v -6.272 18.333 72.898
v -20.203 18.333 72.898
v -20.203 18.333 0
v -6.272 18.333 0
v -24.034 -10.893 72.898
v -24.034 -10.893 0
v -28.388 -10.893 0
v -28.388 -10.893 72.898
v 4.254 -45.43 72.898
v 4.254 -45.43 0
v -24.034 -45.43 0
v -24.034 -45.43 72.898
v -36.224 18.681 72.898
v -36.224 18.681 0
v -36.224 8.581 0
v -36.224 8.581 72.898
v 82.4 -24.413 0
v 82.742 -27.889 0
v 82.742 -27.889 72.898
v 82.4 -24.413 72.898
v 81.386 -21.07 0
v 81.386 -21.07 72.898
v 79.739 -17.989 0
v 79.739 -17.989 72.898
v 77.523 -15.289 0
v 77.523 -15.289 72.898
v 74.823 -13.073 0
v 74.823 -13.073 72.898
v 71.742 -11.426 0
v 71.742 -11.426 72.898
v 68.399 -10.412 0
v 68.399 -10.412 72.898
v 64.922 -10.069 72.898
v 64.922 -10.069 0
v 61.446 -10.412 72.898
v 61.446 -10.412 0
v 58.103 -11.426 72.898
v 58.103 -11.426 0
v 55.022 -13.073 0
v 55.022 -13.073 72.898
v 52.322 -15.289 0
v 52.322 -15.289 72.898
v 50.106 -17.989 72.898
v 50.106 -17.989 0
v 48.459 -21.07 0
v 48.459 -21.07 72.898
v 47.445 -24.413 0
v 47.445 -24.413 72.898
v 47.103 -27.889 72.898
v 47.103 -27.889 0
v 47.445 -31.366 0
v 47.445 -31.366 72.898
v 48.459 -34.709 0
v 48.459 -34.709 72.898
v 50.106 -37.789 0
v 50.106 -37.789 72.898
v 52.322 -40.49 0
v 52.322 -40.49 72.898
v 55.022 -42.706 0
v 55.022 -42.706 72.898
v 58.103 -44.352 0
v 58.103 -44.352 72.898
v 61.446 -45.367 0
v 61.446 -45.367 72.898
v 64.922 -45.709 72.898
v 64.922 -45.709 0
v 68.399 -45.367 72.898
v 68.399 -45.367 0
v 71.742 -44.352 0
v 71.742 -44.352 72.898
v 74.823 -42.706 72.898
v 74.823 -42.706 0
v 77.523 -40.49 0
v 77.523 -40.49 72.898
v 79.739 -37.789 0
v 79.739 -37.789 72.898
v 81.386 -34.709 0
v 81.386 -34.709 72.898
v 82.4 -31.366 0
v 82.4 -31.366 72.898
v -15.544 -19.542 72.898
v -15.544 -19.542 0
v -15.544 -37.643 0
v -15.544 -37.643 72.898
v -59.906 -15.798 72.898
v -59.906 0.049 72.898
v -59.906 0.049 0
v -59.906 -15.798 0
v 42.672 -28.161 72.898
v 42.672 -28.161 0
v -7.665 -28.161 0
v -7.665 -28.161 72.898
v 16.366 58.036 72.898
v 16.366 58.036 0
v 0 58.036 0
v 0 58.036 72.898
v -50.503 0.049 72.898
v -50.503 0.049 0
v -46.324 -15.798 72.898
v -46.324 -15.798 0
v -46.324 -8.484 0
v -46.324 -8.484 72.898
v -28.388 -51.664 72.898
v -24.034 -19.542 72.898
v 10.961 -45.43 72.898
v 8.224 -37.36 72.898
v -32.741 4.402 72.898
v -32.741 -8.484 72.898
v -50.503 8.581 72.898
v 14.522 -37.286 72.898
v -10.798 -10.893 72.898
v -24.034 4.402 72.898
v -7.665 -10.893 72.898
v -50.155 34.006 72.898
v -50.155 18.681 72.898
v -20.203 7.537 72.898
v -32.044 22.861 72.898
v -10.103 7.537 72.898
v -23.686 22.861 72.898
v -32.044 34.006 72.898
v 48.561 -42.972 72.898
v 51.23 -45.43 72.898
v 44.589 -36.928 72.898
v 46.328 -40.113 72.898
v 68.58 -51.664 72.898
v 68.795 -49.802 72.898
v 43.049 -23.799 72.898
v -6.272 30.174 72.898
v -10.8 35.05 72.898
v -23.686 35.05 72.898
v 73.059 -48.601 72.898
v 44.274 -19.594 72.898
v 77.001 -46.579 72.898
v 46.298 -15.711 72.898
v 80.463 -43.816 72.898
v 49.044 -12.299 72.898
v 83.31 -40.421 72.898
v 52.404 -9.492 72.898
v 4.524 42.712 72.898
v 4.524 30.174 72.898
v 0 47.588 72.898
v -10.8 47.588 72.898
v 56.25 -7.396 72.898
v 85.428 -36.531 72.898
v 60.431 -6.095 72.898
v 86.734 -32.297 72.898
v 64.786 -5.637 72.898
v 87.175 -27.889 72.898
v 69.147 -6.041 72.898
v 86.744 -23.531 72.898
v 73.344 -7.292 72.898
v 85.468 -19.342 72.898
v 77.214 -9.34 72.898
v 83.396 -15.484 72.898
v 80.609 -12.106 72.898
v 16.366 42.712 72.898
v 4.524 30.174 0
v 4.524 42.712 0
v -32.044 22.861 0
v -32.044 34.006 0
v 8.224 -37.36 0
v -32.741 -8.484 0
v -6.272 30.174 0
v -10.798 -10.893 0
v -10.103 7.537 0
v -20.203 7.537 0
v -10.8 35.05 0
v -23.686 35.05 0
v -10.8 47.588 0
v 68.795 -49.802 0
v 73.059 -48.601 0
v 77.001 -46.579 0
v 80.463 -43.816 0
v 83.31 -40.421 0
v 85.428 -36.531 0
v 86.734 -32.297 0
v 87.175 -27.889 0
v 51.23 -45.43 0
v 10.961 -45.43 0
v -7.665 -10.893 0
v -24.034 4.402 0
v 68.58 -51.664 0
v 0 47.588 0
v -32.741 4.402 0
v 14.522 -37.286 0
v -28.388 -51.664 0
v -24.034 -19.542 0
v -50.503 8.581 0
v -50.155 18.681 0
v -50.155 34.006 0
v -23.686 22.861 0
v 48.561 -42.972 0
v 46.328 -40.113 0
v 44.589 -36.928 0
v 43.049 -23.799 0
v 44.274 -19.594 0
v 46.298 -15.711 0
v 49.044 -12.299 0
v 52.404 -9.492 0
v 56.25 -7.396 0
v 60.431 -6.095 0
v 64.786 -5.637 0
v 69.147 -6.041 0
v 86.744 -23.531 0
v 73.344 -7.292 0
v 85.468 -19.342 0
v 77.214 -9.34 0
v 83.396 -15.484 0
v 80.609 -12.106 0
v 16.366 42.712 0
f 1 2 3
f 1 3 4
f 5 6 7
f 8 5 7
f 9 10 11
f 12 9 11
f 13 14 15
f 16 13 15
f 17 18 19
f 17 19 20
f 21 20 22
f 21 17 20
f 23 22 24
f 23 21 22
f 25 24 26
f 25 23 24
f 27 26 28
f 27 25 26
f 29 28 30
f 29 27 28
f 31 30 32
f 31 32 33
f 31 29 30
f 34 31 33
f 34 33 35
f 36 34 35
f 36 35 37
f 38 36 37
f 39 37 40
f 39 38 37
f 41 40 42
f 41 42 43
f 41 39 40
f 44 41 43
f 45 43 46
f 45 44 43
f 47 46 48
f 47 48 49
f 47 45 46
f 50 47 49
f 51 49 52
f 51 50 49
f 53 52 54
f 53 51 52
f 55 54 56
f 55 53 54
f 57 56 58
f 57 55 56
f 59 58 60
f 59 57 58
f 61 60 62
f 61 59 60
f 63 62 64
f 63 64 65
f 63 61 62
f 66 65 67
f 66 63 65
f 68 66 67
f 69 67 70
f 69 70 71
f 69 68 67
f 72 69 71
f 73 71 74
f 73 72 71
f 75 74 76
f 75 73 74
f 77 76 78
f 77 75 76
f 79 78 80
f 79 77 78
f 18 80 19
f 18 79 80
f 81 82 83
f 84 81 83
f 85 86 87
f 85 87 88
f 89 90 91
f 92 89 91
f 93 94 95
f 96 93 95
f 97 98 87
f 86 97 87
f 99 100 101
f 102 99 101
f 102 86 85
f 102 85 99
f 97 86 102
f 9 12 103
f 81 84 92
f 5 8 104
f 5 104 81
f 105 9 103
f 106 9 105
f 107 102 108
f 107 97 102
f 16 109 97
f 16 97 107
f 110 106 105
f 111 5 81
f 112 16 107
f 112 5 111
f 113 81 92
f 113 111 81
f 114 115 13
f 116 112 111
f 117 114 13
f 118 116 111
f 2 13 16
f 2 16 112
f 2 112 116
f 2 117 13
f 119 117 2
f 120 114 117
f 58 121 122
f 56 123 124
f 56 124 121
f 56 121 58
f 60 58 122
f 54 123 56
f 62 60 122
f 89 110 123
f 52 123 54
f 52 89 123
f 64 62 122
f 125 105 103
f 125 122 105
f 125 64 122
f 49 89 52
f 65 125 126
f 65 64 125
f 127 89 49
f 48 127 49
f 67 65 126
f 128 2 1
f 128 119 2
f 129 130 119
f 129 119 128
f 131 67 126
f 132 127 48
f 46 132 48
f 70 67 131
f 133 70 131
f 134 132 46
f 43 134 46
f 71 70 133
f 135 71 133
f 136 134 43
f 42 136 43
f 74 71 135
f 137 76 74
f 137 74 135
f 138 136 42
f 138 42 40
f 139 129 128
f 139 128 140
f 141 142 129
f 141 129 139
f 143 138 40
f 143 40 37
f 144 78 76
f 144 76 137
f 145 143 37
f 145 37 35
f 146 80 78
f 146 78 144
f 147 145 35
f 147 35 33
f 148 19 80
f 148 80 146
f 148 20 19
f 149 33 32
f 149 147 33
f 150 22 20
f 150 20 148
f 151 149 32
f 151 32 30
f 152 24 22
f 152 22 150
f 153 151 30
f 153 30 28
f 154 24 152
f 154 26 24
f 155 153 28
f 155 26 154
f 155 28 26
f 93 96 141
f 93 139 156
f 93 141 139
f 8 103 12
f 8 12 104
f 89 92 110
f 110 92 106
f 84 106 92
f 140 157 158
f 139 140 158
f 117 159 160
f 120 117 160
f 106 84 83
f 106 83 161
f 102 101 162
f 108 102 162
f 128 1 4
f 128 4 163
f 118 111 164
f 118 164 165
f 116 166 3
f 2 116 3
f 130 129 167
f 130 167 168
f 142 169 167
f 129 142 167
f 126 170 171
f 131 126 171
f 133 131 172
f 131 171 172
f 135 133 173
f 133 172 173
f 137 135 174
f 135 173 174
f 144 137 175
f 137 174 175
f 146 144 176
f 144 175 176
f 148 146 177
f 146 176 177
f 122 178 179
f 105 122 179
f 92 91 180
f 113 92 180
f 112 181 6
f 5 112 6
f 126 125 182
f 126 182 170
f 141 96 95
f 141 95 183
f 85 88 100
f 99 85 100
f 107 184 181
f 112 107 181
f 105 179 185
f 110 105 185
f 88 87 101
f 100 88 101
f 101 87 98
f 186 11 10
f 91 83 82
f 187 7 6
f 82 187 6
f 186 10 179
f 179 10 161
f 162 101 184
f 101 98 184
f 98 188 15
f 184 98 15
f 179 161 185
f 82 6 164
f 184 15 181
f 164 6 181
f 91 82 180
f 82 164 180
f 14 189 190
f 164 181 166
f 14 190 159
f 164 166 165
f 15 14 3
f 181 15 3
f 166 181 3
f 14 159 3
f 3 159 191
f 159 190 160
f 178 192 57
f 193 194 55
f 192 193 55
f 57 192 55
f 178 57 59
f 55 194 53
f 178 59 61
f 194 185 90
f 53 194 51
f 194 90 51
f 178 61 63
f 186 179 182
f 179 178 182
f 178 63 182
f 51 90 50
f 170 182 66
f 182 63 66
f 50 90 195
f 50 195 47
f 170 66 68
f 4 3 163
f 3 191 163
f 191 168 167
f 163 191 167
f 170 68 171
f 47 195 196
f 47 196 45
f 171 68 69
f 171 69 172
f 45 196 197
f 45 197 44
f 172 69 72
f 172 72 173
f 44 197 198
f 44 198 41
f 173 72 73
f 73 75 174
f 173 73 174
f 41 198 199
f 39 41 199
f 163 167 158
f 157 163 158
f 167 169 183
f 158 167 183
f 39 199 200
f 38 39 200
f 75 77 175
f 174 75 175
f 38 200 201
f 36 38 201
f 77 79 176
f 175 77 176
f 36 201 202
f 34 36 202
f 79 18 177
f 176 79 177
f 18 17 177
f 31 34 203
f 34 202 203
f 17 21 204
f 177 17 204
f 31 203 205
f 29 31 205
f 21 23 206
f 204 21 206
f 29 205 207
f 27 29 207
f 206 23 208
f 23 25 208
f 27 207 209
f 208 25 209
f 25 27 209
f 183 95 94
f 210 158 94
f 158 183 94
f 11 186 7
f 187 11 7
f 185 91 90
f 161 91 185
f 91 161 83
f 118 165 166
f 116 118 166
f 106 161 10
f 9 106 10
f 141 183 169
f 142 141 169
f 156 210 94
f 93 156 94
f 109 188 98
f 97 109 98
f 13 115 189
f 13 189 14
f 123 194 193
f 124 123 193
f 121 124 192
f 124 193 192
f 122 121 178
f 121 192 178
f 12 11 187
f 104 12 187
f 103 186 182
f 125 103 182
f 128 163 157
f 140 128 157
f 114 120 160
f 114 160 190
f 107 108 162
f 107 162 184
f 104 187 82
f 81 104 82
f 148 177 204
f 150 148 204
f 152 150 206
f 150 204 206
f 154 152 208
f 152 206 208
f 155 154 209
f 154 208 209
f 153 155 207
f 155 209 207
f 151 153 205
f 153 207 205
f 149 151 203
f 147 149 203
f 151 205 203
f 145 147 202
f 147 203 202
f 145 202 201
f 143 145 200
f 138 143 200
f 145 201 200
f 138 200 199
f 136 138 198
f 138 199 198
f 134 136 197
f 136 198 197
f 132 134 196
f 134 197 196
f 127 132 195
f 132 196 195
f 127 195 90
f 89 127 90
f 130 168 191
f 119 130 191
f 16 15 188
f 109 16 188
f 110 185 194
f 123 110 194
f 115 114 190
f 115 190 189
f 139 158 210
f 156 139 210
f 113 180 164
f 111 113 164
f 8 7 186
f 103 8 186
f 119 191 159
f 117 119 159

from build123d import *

# Parameters (mm, degrees)
F0_R     = 17.819723
F1_DEPTH = 72.898


with BuildPart() as f1:
    # F0 (on Top) → F1 (new body)
    with BuildSketch(Plane.XY):
        Polygon((16.365739, 42.712353), (16.365739, 58.036424), (0, 58.036424), (0, 47.588196), (-10.799658, 47.588196), (-10.799658, 35.050321), (-23.685807, 35.050321), (-23.685807, 22.860721), (-32.044392, 22.860721), (-32.044392, 34.0055), (-50.154656, 34.0055), (-50.154656, 18.681431), (-36.223684, 18.681431), (-36.223684, 8.581474), (-50.50293, 8.581474), (-50.50293, 0.048754), (-59.906334, 0.048754), (-59.906334, -15.797727), (-46.323638, -15.797727), (-46.323638, -8.483966), (-32.740939, -8.483966), (-32.740939, 4.402183), (-24.034083, 4.402183), (-24.034083, -10.892829), (-10.797826, -10.892829), (-10.103109, 7.536652), (-20.203065, 7.536652), (-20.203065, 18.333156), (-10.103109, 18.333156), (-6.272093, 18.333156), (-6.272093, 30.174481), (4.524411, 30.174481), (4.524411, 42.712353), align=None)
        with BuildLine():
            Line((-7.66519, -10.892829), (-10.797826, -10.892829))
            Line((-10.797826, -10.892829), (-24.034083, -10.892829))
            Line((-24.034083, -10.892829), (-28.387511, -10.892829))
            Line((-28.387511, -10.892829), (-28.387511, -46.7868))
            Line((-28.387511, -46.7868), (-28.387511, -51.6636))
            Line((-28.387511, -51.6636), (68.580002, -51.6636))
            Line((68.580002, -51.6636), (68.795034, -49.802116))
            ThreePointArc((68.795034, -49.802116), (59.54773, -49.482859), (51.229698, -45.430098))
            Line((51.229698, -45.430098), (10.961137, -45.430098))
            Line((10.961137, -45.430098), (4.253947, -45.430098))
            Line((4.253947, -45.430098), (-7.66519, -45.430098))
            Line((-7.66519, -45.430098), (-24.034083, -45.430098))
            Line((-24.034083, -45.430098), (-24.034083, -19.541675))
            Line((-24.034083, -19.541675), (-15.543758, -19.541675))
            Line((-15.543758, -19.541675), (-15.543758, -32.4612))
            Line((-15.543758, -32.4612), (-15.543758, -37.642799))
            Line((-15.543758, -37.642799), (8.223667, -37.360428))
            Line((8.223667, -37.360428), (14.522387, -37.285595))
            Line((14.522387, -37.285595), (44.588531, -36.928391))
            ThreePointArc((44.588531, -36.928391), (43.183524, -32.642564), (42.671578, -28.161463))
            Line((42.671578, -28.161463), (-7.66519, -28.161463))
            Line((-7.66519, -28.161463), (-7.66519, -10.892829))
        make_face()
        with BuildLine():
            ThreePointArc((87.174887, -27.8892), (64.786265, -5.637128), (42.671578, -28.161463))
            ThreePointArc((42.671578, -28.161463), (43.183524, -32.642564), (44.588531, -36.928391))
            ThreePointArc((44.588531, -36.928391), (47.386105, -41.587797), (51.229698, -45.430098))
            ThreePointArc((51.229698, -45.430098), (59.54773, -49.482859), (68.795034, -49.802116))
            ThreePointArc((68.795034, -49.802116), (81.971578, -42.189505), (87.174887, -27.8892))
        make_face()
        with Locations((64.9224, -27.8892)):
            Circle(F0_R, mode=Mode.SUBTRACT)
        Polygon((10.961137, -45.430098), (14.522387, -37.285595), (8.223667, -37.360428), (4.253947, -45.430098), align=None)
    extrude(amount=F1_DEPTH)


solid = f1.part
